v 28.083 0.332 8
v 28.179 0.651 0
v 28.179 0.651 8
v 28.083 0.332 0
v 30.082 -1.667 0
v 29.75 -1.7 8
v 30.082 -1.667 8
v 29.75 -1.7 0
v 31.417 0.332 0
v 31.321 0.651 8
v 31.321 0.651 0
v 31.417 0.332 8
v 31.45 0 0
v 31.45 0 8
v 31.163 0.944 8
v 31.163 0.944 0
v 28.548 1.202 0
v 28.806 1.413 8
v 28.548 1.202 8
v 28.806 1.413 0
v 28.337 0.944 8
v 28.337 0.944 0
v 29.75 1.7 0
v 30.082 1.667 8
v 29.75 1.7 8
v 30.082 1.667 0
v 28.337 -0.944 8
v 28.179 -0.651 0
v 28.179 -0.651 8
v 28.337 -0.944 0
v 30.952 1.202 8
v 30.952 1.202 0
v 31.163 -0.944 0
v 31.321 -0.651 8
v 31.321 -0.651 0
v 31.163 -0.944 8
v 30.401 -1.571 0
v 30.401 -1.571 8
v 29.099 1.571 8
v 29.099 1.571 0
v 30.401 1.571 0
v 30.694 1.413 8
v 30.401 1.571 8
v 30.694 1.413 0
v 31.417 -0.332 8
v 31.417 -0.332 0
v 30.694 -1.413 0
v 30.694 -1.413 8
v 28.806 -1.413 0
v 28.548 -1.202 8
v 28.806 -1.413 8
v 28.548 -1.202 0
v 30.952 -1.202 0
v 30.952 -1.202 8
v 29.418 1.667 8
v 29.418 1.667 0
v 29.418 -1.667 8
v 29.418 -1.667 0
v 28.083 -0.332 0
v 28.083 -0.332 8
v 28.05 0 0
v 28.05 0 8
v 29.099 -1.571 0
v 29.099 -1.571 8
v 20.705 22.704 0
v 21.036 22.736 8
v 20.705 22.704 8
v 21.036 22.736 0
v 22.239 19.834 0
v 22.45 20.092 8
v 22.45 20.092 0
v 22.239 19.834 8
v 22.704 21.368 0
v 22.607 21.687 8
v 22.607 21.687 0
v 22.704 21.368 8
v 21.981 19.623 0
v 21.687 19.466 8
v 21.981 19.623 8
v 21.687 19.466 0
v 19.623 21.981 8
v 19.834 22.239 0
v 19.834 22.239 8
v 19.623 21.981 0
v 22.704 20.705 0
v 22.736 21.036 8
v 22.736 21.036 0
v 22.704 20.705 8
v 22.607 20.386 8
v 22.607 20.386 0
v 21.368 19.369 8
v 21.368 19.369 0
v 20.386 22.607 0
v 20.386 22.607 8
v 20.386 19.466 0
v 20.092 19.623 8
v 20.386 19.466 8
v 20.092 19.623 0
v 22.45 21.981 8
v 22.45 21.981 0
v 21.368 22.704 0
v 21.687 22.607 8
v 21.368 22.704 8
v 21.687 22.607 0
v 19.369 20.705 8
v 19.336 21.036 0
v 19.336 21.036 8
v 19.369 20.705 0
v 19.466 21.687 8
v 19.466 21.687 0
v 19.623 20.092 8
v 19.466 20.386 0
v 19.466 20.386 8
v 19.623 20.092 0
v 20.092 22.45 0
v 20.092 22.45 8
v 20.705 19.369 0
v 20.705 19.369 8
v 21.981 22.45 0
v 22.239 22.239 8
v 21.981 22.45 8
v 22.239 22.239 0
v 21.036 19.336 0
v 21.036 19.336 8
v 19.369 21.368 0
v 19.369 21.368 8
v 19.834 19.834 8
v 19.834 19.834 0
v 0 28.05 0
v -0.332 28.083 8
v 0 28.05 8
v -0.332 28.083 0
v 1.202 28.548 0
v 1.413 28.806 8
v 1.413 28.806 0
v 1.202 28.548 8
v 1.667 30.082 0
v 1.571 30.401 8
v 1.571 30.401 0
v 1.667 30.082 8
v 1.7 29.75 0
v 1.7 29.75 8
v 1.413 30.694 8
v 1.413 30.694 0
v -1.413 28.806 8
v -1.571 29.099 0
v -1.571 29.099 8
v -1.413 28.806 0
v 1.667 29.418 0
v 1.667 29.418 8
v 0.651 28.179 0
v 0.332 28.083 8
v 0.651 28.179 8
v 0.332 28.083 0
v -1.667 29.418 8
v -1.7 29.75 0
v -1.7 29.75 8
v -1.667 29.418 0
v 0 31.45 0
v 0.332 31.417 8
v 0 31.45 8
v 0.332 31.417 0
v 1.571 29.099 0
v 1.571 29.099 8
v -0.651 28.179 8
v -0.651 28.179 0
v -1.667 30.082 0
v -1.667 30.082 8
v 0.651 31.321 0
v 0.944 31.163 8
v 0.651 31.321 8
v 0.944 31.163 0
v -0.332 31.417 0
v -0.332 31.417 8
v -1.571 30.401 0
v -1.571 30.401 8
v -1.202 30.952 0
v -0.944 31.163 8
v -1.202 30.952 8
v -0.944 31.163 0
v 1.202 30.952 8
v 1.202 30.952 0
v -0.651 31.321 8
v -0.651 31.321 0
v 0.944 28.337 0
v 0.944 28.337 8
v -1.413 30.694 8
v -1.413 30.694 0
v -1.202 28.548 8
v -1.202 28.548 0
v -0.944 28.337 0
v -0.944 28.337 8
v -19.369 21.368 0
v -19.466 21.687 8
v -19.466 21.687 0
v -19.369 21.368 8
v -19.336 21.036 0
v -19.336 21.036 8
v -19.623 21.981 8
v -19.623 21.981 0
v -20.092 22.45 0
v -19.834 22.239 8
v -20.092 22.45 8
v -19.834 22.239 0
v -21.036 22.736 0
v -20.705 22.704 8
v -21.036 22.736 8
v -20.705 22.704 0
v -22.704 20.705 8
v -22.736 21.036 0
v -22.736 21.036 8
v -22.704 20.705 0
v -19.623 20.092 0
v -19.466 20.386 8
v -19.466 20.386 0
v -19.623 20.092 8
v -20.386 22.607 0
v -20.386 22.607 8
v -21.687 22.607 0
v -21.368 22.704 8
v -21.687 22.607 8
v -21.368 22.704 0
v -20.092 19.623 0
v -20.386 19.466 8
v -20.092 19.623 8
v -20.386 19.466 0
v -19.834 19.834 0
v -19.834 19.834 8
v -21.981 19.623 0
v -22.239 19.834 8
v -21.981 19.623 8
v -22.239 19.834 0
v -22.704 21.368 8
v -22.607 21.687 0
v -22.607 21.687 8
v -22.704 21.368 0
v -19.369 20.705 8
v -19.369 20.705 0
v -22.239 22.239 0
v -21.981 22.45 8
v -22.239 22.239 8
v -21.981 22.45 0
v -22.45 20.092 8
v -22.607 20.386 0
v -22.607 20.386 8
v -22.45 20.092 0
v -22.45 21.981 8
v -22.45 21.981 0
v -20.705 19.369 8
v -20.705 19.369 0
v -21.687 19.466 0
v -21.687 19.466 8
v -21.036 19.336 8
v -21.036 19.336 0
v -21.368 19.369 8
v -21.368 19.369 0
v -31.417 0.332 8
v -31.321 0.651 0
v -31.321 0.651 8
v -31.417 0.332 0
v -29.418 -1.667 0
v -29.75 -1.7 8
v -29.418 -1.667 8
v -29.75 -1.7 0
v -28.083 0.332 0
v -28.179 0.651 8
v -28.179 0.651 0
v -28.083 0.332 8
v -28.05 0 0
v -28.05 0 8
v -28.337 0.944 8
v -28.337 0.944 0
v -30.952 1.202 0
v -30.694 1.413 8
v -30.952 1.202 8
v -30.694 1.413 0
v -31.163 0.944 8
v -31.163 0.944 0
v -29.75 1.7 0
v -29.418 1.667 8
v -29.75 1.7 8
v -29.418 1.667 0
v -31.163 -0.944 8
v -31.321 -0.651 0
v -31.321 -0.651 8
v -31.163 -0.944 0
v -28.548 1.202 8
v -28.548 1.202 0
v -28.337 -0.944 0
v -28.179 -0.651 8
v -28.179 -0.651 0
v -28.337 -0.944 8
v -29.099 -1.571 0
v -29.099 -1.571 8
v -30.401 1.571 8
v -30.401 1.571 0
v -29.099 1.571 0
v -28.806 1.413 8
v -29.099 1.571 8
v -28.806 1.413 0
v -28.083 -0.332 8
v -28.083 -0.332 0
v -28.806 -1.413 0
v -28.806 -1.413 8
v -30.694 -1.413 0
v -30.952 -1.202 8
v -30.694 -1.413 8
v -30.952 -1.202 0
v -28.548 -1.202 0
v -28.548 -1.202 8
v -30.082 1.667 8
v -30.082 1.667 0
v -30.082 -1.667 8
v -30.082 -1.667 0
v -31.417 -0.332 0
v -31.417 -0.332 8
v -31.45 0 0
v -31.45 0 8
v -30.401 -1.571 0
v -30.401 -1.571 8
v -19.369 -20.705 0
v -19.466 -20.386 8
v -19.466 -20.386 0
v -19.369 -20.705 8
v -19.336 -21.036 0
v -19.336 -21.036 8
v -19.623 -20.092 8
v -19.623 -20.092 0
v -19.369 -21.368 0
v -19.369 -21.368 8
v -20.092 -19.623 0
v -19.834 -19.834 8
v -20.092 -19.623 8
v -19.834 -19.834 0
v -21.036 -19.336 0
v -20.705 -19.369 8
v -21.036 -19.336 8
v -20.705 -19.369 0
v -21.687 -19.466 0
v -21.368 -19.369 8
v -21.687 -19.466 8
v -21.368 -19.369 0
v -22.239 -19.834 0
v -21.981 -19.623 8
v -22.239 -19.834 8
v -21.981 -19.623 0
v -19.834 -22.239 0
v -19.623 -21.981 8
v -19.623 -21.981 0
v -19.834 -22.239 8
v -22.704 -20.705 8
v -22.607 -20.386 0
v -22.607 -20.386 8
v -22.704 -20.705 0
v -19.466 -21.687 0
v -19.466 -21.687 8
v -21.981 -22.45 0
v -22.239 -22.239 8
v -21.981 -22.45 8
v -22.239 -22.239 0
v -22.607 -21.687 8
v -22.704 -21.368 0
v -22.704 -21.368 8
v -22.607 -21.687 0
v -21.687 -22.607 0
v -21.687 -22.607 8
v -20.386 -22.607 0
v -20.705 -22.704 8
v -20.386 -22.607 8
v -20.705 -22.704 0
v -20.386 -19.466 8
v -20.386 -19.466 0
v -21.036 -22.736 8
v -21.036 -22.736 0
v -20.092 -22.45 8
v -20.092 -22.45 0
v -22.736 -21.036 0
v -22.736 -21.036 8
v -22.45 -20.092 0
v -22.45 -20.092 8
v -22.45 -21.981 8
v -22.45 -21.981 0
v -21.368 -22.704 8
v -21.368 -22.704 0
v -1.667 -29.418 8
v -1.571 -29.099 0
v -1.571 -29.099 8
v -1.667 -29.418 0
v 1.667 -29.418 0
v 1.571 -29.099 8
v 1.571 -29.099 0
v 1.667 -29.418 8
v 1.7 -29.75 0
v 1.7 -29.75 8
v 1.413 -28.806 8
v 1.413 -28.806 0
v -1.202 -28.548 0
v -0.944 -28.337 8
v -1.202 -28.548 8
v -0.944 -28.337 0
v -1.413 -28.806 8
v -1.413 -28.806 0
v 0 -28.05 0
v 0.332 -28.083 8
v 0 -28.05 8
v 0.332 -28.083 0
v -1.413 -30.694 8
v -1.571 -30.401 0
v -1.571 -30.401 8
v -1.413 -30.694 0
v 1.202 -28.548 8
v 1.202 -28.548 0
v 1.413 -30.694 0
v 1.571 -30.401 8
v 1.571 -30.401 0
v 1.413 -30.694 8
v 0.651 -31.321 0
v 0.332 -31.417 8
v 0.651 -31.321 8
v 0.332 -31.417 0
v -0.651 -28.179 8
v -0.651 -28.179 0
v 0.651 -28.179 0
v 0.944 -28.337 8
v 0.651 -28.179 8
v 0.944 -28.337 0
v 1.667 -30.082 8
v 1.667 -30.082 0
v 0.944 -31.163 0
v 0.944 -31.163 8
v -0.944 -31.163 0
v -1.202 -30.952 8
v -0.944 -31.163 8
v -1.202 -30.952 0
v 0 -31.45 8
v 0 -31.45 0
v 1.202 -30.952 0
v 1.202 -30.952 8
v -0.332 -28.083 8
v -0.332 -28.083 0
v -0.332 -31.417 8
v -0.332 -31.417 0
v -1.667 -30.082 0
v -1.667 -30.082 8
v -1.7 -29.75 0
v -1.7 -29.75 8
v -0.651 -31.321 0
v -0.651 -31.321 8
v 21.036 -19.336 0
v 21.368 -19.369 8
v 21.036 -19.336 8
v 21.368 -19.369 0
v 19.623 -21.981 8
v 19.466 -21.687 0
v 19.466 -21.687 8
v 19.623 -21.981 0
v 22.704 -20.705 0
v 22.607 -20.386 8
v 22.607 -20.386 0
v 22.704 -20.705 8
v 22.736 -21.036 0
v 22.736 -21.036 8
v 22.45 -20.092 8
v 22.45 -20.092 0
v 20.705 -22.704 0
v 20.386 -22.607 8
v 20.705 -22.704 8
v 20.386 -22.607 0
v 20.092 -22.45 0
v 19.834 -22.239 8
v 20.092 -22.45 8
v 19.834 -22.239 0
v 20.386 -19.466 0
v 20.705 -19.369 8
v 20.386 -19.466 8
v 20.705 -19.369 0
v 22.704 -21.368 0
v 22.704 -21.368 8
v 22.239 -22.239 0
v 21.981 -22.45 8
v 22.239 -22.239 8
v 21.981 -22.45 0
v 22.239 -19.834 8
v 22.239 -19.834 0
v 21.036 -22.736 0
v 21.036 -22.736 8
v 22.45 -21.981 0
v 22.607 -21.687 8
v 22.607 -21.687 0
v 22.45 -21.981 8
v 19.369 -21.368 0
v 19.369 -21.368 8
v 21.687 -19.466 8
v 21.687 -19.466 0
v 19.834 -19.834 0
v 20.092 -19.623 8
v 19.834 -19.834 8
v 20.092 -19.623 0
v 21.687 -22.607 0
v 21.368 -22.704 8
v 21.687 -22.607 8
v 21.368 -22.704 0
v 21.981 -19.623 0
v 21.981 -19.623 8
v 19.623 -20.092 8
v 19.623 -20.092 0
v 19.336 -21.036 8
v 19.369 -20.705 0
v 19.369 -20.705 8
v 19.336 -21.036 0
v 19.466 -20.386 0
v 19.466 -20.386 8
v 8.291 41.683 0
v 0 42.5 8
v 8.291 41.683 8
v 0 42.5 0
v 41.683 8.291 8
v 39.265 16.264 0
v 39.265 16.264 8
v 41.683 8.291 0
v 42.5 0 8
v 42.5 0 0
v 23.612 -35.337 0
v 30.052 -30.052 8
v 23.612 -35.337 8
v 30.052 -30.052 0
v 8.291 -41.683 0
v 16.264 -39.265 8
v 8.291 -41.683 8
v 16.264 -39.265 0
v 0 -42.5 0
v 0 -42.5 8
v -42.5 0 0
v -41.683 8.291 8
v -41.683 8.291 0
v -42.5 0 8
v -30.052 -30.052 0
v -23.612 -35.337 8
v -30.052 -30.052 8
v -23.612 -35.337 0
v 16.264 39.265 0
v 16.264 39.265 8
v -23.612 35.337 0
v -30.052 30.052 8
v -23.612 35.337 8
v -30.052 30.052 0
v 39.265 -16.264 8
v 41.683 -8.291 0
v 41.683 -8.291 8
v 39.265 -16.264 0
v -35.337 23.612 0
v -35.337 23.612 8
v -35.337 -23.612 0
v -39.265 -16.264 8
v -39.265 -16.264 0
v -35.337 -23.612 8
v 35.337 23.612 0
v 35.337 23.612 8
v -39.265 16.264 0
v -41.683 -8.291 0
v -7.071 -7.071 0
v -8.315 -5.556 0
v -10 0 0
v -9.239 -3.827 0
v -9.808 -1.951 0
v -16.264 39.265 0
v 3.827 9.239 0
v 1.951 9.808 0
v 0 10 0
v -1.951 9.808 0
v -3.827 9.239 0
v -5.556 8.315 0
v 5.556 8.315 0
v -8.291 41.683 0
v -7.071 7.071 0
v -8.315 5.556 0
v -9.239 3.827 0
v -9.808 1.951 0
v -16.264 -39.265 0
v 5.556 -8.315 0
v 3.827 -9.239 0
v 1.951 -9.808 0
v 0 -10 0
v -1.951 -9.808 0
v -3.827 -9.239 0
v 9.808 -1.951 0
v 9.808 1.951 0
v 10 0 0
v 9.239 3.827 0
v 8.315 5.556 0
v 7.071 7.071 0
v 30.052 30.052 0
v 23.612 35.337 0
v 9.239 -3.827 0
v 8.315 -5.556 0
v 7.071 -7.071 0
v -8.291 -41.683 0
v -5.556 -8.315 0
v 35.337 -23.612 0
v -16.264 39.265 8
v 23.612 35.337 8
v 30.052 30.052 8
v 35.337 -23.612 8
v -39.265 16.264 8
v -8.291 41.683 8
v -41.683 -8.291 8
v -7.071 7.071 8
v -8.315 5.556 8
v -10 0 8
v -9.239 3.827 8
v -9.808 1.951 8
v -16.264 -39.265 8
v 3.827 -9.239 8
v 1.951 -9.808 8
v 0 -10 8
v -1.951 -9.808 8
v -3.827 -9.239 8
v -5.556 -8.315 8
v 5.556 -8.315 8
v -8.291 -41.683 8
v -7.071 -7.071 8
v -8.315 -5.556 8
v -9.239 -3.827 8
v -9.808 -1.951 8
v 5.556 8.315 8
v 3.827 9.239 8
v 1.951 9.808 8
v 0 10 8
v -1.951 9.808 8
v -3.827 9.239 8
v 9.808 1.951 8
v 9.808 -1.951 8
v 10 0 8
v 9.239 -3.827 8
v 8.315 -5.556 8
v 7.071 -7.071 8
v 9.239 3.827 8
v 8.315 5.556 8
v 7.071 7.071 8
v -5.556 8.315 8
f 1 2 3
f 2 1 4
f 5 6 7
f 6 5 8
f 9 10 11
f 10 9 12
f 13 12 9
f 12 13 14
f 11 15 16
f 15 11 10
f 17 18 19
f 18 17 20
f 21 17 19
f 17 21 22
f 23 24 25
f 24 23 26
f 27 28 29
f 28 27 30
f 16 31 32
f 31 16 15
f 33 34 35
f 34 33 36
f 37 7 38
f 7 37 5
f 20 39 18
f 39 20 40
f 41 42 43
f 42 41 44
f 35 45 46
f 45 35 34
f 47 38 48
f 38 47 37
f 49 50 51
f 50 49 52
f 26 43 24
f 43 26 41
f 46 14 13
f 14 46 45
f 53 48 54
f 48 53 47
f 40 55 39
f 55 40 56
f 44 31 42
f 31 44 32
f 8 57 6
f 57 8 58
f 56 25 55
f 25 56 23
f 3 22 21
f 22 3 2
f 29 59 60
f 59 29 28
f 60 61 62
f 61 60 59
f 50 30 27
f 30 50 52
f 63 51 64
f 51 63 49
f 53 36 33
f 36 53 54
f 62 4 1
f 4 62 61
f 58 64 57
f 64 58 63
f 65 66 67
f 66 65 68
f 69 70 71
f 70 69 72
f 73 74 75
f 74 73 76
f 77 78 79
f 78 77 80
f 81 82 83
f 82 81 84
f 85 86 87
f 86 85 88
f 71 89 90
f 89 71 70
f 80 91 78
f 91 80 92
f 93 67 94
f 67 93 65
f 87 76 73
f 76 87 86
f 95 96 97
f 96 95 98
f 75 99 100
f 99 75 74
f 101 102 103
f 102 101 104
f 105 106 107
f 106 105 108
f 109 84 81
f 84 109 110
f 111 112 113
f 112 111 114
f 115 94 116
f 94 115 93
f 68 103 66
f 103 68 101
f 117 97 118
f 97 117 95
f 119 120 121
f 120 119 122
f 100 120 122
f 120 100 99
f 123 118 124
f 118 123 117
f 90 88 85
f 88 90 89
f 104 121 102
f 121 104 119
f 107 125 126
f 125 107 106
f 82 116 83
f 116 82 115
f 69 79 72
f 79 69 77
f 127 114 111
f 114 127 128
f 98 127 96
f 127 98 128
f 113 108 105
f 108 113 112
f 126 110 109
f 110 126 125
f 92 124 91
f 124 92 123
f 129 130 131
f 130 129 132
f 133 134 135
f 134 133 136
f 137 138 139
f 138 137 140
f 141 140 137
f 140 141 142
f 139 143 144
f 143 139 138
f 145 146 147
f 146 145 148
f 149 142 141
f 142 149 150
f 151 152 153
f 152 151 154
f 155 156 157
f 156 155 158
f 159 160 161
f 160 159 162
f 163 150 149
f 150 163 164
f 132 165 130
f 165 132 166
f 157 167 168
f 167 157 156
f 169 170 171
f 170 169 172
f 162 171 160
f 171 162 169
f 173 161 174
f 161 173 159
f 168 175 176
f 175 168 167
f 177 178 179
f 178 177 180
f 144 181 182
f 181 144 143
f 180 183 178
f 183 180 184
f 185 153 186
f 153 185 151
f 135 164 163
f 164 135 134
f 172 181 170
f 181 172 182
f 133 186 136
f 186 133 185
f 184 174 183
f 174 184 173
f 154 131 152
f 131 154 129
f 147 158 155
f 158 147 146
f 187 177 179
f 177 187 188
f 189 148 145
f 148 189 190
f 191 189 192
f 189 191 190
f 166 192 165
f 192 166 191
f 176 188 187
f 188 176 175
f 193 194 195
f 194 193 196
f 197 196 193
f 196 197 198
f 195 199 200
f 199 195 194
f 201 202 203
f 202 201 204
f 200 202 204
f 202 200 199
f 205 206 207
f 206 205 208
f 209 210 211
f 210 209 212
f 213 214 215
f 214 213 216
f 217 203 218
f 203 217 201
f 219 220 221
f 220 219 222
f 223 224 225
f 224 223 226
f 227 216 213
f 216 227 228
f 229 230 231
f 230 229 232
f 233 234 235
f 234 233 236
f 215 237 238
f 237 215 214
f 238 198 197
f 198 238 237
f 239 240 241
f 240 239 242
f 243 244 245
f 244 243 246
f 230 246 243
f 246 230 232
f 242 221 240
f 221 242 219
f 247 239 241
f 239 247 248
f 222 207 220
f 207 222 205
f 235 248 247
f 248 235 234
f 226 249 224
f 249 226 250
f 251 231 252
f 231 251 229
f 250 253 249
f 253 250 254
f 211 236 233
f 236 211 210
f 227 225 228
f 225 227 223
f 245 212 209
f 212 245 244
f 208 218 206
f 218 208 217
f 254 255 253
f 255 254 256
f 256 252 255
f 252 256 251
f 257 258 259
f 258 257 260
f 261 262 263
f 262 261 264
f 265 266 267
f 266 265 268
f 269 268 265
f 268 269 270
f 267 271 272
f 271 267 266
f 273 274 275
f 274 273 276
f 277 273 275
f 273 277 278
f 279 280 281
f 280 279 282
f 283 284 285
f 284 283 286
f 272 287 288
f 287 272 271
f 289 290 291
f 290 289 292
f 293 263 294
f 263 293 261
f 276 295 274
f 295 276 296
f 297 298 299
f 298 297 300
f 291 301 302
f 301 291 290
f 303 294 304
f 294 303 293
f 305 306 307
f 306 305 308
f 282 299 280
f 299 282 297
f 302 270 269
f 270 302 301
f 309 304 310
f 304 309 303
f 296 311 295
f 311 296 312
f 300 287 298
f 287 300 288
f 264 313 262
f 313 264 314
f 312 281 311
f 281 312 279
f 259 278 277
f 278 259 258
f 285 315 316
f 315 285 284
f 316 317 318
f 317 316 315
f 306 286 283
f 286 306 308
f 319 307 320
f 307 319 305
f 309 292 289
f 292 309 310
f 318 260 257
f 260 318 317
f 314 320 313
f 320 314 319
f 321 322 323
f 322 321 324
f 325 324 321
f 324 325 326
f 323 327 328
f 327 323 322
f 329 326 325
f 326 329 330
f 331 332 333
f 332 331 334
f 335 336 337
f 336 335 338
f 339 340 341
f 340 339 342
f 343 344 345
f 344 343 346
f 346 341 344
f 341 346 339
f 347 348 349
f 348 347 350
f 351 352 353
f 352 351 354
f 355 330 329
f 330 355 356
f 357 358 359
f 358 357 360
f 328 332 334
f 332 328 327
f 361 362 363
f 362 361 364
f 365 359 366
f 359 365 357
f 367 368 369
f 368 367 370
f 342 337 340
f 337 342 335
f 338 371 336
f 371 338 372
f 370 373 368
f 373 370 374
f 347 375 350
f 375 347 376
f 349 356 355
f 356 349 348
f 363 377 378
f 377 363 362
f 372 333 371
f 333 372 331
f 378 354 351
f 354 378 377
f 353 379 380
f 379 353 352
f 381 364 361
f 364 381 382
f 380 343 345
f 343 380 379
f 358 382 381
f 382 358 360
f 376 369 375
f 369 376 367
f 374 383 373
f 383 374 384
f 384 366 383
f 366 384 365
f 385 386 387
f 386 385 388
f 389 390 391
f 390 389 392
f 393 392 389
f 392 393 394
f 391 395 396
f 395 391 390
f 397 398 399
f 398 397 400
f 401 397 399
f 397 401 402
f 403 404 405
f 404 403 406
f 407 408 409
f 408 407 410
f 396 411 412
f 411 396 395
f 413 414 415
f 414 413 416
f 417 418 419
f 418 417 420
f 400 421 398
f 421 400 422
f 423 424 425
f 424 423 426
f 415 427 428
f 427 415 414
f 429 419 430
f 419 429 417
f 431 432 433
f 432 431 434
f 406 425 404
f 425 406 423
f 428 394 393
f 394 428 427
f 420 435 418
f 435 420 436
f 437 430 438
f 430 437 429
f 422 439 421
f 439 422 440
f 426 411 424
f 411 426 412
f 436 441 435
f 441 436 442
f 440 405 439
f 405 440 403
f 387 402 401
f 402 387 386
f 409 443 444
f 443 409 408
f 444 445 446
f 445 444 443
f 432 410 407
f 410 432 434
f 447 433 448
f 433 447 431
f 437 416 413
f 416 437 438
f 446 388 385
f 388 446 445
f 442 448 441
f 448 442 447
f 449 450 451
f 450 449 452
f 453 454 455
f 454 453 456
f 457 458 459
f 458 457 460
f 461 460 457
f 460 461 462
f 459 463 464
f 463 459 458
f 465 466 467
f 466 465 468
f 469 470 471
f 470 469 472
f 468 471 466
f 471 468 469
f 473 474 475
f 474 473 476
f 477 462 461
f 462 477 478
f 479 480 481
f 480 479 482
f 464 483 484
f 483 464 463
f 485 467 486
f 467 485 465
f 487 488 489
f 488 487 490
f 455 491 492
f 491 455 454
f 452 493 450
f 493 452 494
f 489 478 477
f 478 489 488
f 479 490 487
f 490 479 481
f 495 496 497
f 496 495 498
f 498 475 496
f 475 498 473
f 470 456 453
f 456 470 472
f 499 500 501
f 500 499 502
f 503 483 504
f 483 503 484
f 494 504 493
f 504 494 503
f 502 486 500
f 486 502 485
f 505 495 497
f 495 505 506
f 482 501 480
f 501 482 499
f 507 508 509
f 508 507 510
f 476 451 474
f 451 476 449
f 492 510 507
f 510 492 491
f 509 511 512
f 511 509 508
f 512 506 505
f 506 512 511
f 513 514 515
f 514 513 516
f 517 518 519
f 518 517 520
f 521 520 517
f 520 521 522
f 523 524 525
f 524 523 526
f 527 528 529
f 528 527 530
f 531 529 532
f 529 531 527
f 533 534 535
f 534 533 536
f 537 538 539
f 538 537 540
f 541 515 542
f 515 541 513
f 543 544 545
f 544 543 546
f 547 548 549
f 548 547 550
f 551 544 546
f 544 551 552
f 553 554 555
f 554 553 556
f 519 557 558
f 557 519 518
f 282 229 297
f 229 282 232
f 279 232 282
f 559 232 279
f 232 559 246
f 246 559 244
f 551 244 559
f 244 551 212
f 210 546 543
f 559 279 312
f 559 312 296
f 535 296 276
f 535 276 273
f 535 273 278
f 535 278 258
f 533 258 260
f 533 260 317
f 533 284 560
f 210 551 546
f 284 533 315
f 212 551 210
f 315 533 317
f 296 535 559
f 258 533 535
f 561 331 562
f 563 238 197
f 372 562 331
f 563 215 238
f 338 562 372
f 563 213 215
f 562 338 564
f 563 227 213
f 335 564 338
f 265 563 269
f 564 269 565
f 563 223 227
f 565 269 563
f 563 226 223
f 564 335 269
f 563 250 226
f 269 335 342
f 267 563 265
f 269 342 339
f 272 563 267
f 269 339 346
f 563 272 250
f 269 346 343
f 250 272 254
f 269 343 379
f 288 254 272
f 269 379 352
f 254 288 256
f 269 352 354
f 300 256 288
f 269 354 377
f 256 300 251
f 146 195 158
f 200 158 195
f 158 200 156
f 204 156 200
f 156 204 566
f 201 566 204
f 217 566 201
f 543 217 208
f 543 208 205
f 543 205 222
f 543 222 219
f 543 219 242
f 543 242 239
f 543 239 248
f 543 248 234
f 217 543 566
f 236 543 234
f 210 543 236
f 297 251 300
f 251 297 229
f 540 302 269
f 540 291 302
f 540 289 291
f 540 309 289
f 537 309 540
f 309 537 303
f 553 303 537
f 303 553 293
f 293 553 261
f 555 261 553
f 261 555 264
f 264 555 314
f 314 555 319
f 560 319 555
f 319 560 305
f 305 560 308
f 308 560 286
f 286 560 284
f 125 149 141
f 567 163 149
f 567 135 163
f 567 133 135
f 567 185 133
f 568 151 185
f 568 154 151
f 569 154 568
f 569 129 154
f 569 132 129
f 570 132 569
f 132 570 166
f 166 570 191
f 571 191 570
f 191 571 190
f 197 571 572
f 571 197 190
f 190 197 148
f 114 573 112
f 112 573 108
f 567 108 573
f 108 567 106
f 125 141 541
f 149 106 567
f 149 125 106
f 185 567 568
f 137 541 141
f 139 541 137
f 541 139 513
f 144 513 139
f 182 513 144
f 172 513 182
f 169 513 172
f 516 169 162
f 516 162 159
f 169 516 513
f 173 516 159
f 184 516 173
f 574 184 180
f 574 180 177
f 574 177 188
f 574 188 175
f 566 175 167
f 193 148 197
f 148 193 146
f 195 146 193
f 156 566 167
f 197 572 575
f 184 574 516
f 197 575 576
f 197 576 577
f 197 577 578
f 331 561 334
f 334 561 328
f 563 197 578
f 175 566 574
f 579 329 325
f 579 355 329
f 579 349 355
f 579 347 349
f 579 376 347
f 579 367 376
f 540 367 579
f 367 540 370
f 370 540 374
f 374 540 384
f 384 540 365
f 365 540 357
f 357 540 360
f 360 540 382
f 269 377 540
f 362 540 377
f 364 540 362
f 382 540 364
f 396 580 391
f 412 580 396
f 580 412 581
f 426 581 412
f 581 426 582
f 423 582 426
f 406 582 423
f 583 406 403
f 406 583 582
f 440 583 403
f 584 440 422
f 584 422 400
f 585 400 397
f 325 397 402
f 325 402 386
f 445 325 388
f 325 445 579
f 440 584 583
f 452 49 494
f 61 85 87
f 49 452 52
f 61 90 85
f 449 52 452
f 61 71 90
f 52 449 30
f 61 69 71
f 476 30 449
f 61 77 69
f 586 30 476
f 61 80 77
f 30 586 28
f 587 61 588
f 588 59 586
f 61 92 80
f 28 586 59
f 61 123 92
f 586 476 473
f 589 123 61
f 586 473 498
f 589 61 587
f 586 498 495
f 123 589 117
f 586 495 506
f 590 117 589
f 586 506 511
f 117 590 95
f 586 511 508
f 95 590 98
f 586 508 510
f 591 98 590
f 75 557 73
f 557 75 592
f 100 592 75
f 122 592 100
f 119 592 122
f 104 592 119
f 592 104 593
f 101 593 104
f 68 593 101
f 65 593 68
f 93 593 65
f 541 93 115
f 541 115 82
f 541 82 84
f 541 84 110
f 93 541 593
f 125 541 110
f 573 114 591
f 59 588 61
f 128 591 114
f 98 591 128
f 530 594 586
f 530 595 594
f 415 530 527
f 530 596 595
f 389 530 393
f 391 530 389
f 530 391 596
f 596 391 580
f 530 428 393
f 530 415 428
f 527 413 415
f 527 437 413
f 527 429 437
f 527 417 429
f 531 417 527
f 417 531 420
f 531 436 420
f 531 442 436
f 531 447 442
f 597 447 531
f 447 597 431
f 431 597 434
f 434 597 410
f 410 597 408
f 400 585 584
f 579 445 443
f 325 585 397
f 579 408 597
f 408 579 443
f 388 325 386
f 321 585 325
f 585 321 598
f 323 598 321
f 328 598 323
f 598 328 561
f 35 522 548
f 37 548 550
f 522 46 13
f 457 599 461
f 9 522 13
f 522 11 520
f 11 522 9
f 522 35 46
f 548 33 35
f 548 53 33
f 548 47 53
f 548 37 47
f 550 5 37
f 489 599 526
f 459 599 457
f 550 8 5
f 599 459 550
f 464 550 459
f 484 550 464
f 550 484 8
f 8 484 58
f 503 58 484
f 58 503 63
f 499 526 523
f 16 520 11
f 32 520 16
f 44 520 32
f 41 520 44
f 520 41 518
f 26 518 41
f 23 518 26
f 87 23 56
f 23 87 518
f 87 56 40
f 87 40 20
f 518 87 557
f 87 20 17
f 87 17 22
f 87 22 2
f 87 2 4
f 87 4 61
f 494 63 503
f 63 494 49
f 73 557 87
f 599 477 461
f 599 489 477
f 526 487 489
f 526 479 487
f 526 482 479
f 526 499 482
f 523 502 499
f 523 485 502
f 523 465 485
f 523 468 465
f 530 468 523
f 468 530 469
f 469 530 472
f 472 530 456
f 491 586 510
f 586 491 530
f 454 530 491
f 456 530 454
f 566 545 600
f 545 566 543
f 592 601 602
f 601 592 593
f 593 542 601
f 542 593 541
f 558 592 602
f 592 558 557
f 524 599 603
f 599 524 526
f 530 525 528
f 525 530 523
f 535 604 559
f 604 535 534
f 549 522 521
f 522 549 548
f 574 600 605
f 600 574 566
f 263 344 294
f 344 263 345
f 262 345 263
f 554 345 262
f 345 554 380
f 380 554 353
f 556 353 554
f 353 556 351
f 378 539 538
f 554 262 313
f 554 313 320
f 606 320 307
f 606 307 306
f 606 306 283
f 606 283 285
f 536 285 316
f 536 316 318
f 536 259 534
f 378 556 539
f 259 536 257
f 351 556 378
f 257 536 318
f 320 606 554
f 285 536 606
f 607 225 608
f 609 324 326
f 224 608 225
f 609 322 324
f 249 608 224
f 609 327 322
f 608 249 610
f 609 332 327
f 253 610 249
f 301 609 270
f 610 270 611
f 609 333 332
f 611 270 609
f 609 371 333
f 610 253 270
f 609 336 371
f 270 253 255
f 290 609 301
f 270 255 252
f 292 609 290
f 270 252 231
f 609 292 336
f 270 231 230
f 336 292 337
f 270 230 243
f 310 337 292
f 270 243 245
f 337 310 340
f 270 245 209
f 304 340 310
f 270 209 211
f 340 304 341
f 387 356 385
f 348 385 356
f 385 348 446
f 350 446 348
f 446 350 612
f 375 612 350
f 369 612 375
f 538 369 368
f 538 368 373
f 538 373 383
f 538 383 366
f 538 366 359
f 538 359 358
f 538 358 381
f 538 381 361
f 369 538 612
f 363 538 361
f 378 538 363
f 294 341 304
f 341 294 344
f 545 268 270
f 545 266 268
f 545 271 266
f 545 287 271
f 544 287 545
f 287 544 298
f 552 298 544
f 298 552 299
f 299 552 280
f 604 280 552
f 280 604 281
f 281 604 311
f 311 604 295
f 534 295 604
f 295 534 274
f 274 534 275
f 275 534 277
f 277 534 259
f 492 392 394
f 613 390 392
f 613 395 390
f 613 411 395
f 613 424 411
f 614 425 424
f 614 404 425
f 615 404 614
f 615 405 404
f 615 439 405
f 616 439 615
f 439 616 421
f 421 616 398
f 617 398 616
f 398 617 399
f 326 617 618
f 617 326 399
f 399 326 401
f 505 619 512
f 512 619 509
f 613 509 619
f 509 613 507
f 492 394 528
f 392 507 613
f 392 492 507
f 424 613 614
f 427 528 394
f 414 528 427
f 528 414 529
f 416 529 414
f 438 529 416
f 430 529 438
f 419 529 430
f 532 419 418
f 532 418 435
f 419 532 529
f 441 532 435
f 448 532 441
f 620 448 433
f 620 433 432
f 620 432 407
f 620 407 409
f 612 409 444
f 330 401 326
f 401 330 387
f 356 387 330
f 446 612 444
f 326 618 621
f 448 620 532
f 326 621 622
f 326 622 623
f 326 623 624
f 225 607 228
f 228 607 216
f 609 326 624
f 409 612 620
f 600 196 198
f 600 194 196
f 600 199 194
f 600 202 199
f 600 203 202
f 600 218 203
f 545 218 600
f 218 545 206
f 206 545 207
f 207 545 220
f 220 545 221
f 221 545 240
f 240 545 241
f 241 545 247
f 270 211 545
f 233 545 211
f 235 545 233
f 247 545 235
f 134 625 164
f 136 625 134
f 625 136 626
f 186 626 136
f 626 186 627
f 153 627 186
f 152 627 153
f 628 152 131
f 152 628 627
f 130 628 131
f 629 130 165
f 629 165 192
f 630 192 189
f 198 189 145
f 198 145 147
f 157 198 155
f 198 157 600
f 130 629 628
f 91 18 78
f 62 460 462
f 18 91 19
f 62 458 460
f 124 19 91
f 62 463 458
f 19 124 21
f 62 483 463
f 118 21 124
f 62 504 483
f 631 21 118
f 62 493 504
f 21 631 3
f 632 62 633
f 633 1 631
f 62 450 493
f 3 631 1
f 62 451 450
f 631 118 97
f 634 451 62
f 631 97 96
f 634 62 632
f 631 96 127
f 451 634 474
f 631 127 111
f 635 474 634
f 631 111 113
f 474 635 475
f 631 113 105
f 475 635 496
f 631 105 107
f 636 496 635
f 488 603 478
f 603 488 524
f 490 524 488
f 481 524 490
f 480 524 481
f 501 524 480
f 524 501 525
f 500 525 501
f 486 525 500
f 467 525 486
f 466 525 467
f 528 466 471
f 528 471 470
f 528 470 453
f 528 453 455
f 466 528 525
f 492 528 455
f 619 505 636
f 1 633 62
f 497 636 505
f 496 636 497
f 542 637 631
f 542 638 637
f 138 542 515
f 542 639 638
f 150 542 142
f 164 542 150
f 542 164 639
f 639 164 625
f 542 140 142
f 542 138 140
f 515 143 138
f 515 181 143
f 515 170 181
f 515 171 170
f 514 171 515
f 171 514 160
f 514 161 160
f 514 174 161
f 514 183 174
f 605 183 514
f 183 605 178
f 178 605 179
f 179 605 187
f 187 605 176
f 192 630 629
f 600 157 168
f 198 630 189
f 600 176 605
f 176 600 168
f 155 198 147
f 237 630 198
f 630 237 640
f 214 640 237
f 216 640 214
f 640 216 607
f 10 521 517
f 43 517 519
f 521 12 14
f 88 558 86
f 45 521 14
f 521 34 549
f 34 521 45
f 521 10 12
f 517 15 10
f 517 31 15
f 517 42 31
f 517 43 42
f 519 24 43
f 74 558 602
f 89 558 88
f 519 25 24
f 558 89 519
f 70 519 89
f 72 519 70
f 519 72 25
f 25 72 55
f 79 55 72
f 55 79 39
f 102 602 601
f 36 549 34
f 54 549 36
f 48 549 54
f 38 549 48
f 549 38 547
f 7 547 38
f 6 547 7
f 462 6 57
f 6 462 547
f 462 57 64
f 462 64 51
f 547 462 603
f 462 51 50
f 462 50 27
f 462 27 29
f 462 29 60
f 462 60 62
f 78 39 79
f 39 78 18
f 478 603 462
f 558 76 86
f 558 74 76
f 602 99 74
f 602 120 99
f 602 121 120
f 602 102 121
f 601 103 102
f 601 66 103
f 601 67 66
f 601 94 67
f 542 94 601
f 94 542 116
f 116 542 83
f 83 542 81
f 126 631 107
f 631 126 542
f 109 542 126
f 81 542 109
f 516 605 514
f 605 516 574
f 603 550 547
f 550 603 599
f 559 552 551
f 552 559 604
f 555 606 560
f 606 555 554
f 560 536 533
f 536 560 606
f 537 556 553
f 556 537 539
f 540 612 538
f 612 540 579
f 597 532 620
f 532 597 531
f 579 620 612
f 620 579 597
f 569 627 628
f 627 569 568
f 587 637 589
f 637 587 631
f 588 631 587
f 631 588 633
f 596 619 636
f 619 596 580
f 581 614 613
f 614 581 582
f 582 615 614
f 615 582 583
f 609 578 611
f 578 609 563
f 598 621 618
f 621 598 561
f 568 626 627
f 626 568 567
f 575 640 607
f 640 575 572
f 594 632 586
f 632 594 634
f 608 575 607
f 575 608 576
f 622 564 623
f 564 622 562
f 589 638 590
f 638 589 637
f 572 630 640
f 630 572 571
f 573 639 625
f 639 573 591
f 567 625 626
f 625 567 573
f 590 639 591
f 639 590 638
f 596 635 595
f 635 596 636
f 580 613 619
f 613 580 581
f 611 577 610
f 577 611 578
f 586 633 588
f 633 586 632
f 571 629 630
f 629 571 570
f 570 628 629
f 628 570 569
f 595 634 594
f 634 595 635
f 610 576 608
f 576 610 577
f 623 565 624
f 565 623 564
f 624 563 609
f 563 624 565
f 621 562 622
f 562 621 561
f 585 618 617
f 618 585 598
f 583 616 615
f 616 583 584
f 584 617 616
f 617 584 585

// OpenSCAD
$fn = 32;

// ----------------------------------------------------------------------
// Flange Ø85 x 8
// 8 holes on a Ø59.5 bolt circle, bolted joints
// ----------------------------------------------------------------------

// --- parameters (mm) ---
flange_d = 85;  // outside diameter of the flange
thickness = 8;  // flange thickness
holes = 8;      // number of bolt holes
pcd = 59.5;     // bolt circle diameter
start_deg = 0;  // angle of the first hole, from +X
hole_d = 3.4;   // bolt hole diameter
bore_d = 20;    // central through bore
hub_d = 28;     // hub outside diameter
hub_h = 0;      // hub height above the flange face (0 = no hub)

// --- derived feature positions (mm) ---
height = thickness + hub_h;  // = 8   overall height of the part
pcd_r = pcd / 2;             // = 29.75   bolt circle radius
hole_step = 360 / holes;     // = 45   angular pitch
feature_centers = [
  [pcd_r * cos(start_deg + 0 * hole_step), pcd_r * sin(start_deg + 0 * hole_step)],
  [pcd_r * cos(start_deg + 1 * hole_step), pcd_r * sin(start_deg + 1 * hole_step)],
  [pcd_r * cos(start_deg + 2 * hole_step), pcd_r * sin(start_deg + 2 * hole_step)],
  [pcd_r * cos(start_deg + 3 * hole_step), pcd_r * sin(start_deg + 3 * hole_step)],
  [pcd_r * cos(start_deg + 4 * hole_step), pcd_r * sin(start_deg + 4 * hole_step)],
  [pcd_r * cos(start_deg + 5 * hole_step), pcd_r * sin(start_deg + 5 * hole_step)],
  [pcd_r * cos(start_deg + 6 * hole_step), pcd_r * sin(start_deg + 6 * hole_step)],
  [pcd_r * cos(start_deg + 7 * hole_step), pcd_r * sin(start_deg + 7 * hole_step)]
];   // bolt hole centres on the pitch circle

// flange disc, every hole and the bore cut straight through
difference() {
  union() {
    cylinder(d = flange_d, h = thickness);
  }
  translate([0, 0, -1]) cylinder(d = bore_d, h = height + 2);  // bore, through
  for (centre = feature_centers)
    translate([centre[0], centre[1], -1]) cylinder(d = hole_d, h = thickness + 2);
}
